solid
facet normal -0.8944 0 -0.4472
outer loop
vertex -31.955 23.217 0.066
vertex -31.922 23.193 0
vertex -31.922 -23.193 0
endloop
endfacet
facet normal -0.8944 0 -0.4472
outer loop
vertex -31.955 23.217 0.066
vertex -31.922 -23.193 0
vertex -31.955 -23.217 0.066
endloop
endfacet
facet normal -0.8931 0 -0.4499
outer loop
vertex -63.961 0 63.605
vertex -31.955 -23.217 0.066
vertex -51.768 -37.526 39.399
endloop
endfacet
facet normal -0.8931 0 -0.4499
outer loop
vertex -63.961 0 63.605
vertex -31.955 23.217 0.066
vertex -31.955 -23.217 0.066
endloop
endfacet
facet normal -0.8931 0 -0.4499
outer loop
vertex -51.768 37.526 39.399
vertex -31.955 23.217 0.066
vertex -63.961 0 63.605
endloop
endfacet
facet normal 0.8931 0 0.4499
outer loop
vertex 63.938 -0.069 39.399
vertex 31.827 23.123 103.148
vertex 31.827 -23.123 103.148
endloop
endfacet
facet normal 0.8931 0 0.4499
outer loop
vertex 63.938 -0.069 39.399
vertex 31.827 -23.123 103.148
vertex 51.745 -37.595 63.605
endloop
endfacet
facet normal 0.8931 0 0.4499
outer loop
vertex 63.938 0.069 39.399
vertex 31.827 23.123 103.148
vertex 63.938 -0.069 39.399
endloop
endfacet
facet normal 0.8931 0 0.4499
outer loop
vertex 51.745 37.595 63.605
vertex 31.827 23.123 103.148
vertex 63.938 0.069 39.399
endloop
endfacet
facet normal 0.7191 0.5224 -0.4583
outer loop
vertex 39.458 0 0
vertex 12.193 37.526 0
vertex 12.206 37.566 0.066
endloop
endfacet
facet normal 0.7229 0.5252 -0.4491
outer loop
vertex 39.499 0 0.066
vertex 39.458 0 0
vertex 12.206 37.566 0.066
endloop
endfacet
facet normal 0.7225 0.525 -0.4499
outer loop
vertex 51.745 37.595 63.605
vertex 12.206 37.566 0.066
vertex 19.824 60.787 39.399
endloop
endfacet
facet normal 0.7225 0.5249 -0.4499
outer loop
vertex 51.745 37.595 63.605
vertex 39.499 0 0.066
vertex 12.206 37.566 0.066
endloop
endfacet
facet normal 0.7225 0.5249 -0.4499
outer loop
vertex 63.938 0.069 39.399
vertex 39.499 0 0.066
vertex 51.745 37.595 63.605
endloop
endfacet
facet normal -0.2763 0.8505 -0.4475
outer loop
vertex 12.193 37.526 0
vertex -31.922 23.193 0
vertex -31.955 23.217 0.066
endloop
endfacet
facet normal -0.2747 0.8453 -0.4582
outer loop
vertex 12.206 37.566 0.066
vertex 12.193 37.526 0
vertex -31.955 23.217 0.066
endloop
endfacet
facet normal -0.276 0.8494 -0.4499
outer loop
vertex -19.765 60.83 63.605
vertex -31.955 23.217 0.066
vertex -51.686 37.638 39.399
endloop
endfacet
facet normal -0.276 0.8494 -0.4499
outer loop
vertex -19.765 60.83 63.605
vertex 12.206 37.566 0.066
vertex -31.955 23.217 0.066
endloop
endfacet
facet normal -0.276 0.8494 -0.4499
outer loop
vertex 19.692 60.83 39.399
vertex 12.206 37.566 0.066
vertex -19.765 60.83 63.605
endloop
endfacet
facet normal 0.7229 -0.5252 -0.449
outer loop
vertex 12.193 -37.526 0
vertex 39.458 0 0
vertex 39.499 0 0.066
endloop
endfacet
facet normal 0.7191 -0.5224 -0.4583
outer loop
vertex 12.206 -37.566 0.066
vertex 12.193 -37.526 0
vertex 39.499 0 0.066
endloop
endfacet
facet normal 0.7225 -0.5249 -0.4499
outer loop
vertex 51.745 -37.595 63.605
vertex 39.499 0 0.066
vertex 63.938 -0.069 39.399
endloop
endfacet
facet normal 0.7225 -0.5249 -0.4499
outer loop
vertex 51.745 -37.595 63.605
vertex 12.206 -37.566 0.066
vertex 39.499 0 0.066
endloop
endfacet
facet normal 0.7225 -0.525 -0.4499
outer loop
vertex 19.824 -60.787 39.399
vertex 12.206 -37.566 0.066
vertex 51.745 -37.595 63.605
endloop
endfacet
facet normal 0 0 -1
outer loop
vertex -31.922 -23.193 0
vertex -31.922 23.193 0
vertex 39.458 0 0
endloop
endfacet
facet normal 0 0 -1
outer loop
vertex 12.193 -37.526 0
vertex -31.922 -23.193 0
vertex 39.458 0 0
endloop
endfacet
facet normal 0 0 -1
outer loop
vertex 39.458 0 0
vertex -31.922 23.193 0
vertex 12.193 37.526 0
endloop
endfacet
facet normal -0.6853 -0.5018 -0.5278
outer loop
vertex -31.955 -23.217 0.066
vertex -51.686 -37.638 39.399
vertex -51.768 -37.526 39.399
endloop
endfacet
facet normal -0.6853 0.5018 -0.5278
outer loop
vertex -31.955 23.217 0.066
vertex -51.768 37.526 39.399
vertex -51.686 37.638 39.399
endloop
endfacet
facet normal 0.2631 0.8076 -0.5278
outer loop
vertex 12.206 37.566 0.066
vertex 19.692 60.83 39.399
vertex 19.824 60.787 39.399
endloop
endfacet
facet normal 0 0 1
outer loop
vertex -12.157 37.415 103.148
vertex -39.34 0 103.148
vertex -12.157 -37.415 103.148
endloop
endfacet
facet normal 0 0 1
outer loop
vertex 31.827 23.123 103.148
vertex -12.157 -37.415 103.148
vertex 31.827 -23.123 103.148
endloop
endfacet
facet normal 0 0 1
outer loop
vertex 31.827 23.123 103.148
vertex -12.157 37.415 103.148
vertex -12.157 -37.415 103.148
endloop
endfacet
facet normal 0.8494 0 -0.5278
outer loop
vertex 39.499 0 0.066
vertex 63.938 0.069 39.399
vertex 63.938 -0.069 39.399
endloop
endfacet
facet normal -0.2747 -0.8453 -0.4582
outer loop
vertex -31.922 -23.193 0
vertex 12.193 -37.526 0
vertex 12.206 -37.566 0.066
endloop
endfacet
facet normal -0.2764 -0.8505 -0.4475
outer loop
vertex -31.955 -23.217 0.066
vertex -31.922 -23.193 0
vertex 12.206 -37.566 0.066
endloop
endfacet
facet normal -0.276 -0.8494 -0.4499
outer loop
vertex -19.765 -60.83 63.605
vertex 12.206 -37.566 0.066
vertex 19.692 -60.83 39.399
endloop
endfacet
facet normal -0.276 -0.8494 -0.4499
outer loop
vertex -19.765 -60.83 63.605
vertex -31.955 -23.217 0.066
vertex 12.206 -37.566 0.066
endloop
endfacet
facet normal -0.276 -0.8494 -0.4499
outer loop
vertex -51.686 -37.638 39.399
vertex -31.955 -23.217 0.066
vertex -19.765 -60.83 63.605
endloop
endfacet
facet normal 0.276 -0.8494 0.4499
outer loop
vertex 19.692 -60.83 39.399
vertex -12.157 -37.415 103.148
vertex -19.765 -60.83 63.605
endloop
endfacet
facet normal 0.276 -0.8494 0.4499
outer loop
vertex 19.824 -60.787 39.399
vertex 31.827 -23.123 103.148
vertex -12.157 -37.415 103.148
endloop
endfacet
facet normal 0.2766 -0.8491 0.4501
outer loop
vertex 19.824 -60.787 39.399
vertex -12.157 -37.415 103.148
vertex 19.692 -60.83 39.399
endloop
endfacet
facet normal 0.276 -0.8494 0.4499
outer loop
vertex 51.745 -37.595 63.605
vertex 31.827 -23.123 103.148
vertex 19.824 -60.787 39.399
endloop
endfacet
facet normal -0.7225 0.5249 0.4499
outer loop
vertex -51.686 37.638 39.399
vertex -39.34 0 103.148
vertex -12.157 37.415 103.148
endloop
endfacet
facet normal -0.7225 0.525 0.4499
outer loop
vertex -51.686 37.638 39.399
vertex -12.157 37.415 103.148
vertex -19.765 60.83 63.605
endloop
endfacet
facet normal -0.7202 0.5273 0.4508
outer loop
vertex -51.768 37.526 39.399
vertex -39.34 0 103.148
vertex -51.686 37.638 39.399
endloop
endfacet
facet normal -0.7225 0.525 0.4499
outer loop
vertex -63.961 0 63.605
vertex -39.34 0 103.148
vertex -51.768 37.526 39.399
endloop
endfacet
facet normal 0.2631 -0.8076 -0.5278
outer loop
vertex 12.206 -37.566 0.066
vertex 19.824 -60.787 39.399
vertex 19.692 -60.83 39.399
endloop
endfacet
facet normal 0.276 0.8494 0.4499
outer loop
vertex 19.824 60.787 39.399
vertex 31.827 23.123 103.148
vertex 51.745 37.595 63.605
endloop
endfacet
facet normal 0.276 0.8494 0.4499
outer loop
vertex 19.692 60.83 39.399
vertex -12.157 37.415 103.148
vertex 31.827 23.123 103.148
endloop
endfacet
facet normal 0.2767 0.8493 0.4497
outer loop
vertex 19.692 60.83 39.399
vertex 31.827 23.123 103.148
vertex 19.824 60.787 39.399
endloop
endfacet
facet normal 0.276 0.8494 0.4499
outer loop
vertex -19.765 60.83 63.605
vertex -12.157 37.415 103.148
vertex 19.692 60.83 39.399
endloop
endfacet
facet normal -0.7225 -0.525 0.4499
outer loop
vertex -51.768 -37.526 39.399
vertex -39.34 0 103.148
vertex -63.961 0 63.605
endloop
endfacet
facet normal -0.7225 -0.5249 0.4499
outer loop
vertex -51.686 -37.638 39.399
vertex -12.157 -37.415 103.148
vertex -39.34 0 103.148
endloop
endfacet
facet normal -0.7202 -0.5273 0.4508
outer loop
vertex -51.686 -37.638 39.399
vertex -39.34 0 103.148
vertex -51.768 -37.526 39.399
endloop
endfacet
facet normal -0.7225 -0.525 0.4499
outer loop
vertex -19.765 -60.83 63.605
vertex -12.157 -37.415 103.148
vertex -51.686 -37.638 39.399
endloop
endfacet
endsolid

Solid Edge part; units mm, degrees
sketch "Sketch1" plane through (0, 0, 0) normal (0, -1, 0) x (1, 0, 0)
  line L0 (0, 116.4301) -> (0, -14.6322)
  arc A0 (0, 116.43) -> (0, -14.6322) centre (0, 50.8989) cw
revolve "RevolvedProtrusion1" add sketch "Sketch1" angle 360 about axis through (0, 0, 116.4301) along (0, 0, -1)
sketch "Sketch2" plane through (0, 0, 0) normal (0, -1, 0) x (1, 0, 0)
  line L0 (63.9382, 39.399) -> (39.4576, 0)
  line L1 (31.8267, 103.1475) -> (63.9382, 39.399)
  line L2 (-39.5527, 103.1475) -> (31.8267, 103.1475)
  line L3 (-64.0333, 63.7485) -> (-39.5527, 103.1475)
  line L4 (-31.9218, 0) -> (-64.0333, 63.7485)
extrude "Cutout1" cut sketch "Sketch2" along normal mid plane 248 material side at (51.7404, 0, 19.6731)
pattern_circular "Pattern1" count 5 over 360 about axis through (0, 0, 103.1475) along (0, 0, 1) of "Cutout1"
sketch "Sketch3" plane through (0, 0, 0) normal (0, 0, 1) x (1, 0, 0)
  line L0 (-31.9218, -23.1926) -> (12.1931, -37.5264)
  line L1 (12.1931, -37.5264) -> (39.4576, 0)
  line L2 (39.4576, 0) -> (12.1931, 37.5264)
  line L3 (12.1931, 37.5264) -> (-31.9218, 23.1926)
  line L4 (-31.9218, 23.1926) -> (-31.9218, -23.1926)
extrude "ExtrudedCutout_7" cut sketch "Sketch3" against normal blind 58
